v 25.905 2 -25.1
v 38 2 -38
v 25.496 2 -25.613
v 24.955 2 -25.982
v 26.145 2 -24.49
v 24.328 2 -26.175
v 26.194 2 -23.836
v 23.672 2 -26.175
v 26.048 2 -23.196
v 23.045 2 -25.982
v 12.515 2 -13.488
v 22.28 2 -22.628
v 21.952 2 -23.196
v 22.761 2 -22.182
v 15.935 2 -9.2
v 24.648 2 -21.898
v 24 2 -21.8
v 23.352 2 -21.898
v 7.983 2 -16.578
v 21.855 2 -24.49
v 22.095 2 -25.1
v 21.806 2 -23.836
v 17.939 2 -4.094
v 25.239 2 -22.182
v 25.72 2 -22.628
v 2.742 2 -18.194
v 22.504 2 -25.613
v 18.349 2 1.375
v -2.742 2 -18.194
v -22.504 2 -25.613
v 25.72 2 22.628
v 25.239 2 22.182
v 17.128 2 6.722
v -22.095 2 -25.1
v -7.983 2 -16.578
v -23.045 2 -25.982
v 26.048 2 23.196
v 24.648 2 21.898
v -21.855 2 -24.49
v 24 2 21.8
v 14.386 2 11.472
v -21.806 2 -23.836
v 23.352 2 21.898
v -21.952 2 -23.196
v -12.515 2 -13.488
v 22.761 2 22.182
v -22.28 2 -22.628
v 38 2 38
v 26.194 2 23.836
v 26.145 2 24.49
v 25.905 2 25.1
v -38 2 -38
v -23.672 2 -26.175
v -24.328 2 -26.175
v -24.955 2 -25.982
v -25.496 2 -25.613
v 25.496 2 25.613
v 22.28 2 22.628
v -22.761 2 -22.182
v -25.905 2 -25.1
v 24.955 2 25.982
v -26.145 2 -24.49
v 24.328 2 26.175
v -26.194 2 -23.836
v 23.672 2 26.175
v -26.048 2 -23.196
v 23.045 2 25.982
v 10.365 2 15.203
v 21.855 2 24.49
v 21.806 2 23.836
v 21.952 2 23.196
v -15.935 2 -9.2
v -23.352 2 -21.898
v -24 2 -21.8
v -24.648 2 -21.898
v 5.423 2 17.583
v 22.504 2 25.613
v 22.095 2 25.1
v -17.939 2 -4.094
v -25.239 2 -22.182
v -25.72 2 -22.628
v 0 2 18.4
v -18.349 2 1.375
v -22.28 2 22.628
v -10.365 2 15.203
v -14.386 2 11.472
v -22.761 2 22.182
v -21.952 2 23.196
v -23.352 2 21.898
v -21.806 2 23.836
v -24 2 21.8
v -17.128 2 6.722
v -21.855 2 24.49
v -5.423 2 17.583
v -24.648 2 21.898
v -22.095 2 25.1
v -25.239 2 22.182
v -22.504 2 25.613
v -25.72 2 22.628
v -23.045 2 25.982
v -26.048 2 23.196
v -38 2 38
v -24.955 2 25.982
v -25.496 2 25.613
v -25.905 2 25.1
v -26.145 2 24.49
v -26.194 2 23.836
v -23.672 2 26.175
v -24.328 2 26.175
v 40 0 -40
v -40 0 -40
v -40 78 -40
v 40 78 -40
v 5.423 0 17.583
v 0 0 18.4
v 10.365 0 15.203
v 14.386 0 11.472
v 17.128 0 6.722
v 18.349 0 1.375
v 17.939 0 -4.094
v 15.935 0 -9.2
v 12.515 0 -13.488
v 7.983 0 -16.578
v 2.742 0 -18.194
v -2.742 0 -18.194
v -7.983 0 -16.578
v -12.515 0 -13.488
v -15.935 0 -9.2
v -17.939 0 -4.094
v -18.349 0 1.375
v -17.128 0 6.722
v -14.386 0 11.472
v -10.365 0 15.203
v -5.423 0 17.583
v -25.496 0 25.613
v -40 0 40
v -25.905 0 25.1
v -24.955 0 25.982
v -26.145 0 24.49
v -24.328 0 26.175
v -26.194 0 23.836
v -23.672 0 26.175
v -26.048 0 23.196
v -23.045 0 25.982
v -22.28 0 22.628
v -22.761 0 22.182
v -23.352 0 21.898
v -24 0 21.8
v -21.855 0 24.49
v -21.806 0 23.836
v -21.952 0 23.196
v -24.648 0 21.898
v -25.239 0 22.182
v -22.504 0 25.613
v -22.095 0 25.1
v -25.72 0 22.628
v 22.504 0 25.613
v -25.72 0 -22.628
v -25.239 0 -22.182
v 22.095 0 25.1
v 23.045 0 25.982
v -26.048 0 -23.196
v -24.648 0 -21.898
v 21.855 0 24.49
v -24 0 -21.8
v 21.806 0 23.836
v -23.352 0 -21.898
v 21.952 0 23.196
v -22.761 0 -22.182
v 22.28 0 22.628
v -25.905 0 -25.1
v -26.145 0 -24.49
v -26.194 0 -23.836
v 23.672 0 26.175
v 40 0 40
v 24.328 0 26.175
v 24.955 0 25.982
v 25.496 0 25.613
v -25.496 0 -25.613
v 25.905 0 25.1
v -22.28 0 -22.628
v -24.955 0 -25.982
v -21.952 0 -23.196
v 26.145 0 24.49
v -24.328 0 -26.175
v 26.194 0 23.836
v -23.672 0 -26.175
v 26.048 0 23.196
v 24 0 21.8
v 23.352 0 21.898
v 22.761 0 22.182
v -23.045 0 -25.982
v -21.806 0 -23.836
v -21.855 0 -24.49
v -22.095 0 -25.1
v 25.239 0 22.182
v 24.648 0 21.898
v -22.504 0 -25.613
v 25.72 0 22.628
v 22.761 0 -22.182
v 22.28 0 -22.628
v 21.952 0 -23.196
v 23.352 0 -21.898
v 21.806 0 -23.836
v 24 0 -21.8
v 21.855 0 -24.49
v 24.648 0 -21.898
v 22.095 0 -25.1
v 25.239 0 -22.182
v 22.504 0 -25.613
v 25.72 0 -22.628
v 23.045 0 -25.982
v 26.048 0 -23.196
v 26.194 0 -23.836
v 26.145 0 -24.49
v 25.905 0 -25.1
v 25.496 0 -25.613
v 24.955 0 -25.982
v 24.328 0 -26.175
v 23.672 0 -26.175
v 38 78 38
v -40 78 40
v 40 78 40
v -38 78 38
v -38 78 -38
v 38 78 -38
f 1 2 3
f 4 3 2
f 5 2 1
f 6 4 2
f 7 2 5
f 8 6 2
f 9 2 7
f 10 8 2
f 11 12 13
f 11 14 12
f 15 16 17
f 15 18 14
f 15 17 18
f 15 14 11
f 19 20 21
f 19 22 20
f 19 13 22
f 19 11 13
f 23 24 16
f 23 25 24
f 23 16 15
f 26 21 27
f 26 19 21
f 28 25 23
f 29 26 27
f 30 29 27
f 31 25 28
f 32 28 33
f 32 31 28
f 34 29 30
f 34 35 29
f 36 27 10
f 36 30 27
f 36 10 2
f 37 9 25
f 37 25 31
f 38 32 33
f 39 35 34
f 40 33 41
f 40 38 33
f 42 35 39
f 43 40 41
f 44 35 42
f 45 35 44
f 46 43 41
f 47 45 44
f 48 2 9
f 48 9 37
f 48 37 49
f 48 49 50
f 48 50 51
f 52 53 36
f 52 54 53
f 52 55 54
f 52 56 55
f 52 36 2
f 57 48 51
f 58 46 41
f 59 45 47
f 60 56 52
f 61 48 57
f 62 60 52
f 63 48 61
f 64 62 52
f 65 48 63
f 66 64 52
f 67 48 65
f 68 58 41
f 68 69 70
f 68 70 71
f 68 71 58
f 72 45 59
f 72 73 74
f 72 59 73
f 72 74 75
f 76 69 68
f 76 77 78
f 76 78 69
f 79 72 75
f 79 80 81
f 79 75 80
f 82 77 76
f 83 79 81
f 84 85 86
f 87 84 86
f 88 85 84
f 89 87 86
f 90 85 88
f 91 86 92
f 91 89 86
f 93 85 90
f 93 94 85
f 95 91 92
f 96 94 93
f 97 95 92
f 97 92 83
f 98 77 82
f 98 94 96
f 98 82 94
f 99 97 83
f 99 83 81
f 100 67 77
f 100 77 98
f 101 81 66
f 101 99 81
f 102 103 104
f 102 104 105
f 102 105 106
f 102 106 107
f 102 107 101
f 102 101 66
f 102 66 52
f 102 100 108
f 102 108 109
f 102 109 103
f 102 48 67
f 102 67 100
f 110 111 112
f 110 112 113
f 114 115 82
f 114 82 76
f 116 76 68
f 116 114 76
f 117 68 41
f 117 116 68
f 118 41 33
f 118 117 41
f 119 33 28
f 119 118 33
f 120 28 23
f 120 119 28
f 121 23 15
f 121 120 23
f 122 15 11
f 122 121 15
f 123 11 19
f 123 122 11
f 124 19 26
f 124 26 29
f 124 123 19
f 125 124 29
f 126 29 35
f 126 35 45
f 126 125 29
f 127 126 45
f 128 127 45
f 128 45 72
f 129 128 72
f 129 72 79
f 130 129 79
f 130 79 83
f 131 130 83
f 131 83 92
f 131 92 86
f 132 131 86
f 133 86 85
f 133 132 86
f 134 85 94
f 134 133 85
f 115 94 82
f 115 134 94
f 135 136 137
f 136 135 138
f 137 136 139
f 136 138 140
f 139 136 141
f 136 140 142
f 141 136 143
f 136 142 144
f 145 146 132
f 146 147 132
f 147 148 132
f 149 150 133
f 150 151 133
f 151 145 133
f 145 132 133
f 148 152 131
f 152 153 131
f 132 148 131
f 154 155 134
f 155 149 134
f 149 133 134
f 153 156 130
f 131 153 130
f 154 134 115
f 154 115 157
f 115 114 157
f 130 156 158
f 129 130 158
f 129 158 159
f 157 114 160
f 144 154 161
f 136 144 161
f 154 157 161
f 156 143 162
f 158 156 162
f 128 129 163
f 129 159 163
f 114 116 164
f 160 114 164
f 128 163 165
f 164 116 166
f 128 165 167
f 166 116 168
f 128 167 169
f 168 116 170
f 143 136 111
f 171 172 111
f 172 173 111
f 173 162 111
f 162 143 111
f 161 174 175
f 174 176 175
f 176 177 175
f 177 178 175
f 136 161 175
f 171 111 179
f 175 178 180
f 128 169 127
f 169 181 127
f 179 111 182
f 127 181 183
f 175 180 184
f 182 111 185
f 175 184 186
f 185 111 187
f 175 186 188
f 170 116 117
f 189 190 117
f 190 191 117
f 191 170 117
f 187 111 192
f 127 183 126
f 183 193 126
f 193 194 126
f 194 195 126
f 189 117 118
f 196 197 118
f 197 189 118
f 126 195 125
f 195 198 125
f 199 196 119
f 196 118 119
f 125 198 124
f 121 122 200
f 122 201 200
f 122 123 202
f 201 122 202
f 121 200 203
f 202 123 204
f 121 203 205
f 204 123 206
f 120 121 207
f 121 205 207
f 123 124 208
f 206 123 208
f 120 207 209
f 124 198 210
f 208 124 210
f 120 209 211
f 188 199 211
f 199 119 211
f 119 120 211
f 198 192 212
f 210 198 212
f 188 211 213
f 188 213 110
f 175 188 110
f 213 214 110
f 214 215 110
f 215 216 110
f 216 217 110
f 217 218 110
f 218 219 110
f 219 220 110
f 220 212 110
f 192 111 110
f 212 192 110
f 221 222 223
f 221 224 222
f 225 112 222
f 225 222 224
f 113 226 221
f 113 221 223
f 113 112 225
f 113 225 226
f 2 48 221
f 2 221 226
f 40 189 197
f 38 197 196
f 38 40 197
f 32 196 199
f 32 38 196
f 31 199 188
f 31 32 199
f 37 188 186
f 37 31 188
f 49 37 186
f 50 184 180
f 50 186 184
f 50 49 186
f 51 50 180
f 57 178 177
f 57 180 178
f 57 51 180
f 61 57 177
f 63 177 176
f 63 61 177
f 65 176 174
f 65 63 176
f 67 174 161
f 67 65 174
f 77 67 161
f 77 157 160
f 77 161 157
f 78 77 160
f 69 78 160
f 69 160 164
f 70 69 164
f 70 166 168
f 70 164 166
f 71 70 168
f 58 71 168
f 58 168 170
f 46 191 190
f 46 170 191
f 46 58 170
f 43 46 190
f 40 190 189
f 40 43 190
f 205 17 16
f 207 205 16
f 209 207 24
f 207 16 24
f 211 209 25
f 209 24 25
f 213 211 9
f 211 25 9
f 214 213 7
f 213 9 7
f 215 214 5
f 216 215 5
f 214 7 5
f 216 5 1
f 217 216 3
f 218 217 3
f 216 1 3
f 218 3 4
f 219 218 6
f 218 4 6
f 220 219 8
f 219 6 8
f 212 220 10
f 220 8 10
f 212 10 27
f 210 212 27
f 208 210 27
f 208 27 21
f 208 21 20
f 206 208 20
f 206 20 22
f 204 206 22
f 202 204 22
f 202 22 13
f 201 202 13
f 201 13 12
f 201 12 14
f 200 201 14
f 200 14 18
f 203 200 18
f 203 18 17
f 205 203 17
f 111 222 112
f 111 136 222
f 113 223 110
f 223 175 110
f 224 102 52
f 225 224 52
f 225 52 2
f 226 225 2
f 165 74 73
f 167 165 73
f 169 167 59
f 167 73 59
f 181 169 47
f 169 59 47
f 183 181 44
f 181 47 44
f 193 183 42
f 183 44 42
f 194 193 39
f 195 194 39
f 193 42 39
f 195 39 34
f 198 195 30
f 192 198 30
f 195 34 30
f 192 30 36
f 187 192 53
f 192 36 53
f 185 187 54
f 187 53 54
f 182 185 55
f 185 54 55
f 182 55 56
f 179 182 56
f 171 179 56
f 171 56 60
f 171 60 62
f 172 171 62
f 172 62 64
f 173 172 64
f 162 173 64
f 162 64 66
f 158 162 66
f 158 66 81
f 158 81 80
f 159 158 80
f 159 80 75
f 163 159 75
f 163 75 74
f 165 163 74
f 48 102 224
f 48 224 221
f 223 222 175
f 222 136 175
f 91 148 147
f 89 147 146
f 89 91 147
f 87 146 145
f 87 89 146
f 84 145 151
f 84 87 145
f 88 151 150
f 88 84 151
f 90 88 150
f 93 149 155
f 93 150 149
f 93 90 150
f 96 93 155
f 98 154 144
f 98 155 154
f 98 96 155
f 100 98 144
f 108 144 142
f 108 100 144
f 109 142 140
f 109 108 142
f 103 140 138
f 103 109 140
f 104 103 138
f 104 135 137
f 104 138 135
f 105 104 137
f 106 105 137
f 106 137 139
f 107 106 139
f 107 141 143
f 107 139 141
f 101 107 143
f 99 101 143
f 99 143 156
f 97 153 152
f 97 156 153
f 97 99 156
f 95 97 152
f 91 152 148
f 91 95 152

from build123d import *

# Parameters (mm, degrees)
SKETCH1_W               = 80
SKETCH1_H               = 80
SKETCH1_R               = 18.4
BOSS_EXTRUDE1_DEPTH     = 2
SKETCH2_W               = 4
SKETCH2_H               = 18.5
BOSS_EXTRUDE2_DEPTH     = 15.25
SKETCH3_R               = 2.2
CUT_EXTRUDE1_DEPTH      = 94.976393312
MIRROR2_COPY_1_SKETCH_W = 4
MIRROR2_COPY_1_SKETCH_H = 18.5
MIRROR2_COPY_1_DEPTH    = 15.25
MIRROR2_COPY_2_SKETCH_R = 2.2
MIRROR2_COPY_2_DEPTH    = 94.976393312
SKETCH4_R               = 2.2
CUT_EXTRUDE2_DEPTH      = 62.388618652
SKETCH5_W               = 4
SKETCH5_H               = 15.25
CUT_EXTRUDE3_DEPTH      = 93.258129723
SKETCH6_W               = 80
SKETCH6_H               = 80
SKETCH6_W_2             = 76
SKETCH6_H_2             = 76
BOSS_EXTRUDE3_DEPTH     = 76


with BuildPart() as part:
    # Sketch1 → Boss-Extrude1 (new body)
    with BuildSketch(Plane(origin=(0, 0, 0), x_dir=(1, 0, 0), z_dir=(0, 1, 0))):
        Rectangle(SKETCH1_W, SKETCH1_H)
        with Locations(Location((0, 0, 0), (0, 0, 270))):
            Circle(SKETCH1_R, mode=Mode.SUBTRACT)
    extrude(amount=BOSS_EXTRUDE1_DEPTH)

    # Sketch2 → Boss-Extrude2 (add)
    with BuildSketch(Plane(origin=(0, 2, 0), x_dir=(1, 0, 0), z_dir=(0, 1, 0))):
        with Locations((42, -30.75)):
            Rectangle(SKETCH2_W, SKETCH2_H)
    boss_extrude2 = extrude(amount=-BOSS_EXTRUDE2_DEPTH)

    # Sketch3 → Cut-Extrude1 (cut, through all)
    with BuildSketch(Plane(origin=(44, 0, 0), x_dir=(0, 0, -1), z_dir=(1, 0, 0))):
        with Locations((-30.75, -8.125)):
            Circle(SKETCH3_R)
    cut_extrude1 = extrude(amount=-CUT_EXTRUDE1_DEPTH, mode=Mode.SUBTRACT)

    # Mirror1: Boss-Extrude2, Cut-Extrude1 across plane
    add(boss_extrude2.mirror(Plane(origin=(0, 0, 0), x_dir=(0, 0, 1), z_dir=(1, 0, 0))))
    add(cut_extrude1.mirror(Plane(origin=(0, 0, 0), x_dir=(0, 0, 1), z_dir=(1, 0, 0))), mode=Mode.SUBTRACT)

    # Mirror2: Boss-Extrude2, Cut-Extrude1 across plane
    add(boss_extrude2.mirror(Plane(origin=(0, 0, 0), x_dir=(1, 0, 0), z_dir=(0, 0, -1))))
    add(cut_extrude1.mirror(Plane(origin=(0, 0, 0), x_dir=(1, 0, 0), z_dir=(0, 0, -1))), mode=Mode.SUBTRACT)

    # Mirror2 copy 1 sketch → Mirror2 copy 1 (add)
    with BuildSketch(Plane(origin=(0, 2, 0), x_dir=(-1, 0, 0), z_dir=(0, 1, 0))):
        with Locations((42, -30.75)):
            Rectangle(MIRROR2_COPY_1_SKETCH_W, MIRROR2_COPY_1_SKETCH_H)
    extrude(amount=-MIRROR2_COPY_1_DEPTH)

    # Mirror2 copy 2 sketch → Mirror2 copy 2 (cut, through all)
    with BuildSketch(Plane.ZY.offset(44)):
        with Locations((-30.75, -8.125)):
            Circle(MIRROR2_COPY_2_SKETCH_R)
    extrude(amount=-MIRROR2_COPY_2_DEPTH, mode=Mode.SUBTRACT)

    # Sketch4 → Cut-Extrude2 (cut, through all)
    with BuildSketch(Plane(origin=(0, 2, 0), x_dir=(1, 0, 0), z_dir=(0, 1, 0))):
        with Locations(Location((-24, 24, 0), (0, 0, 270))):
            Circle(SKETCH4_R)
        with Locations(Location((24, 24, 0), (0, 0, 270))):
            Circle(SKETCH4_R)
    cut_extrude2 = extrude(amount=-CUT_EXTRUDE2_DEPTH, mode=Mode.SUBTRACT)

    # Mirror3: Cut-Extrude2 across plane
    add(cut_extrude2.mirror(Plane(origin=(0, 0, 0), x_dir=(1, 0, 0), z_dir=(0, 0, -1))), mode=Mode.SUBTRACT)

    # Sketch5 → Cut-Extrude3 (cut, through all)
    with BuildSketch(Plane.XY.offset(40)):
        with Locations((-42, -5.625)):
            Rectangle(SKETCH5_W, SKETCH5_H)
        with Locations((42, -5.625)):
            Rectangle(SKETCH5_W, SKETCH5_H)
    extrude(amount=-CUT_EXTRUDE3_DEPTH, mode=Mode.SUBTRACT)

    # Sketch6 → Boss-Extrude3 (add)
    with BuildSketch(Plane(origin=(0, 2, 0), x_dir=(1, 0, 0), z_dir=(0, 1, 0))):
        Rectangle(SKETCH6_W, SKETCH6_H)
        Rectangle(SKETCH6_W_2, SKETCH6_H_2, mode=Mode.SUBTRACT)
    extrude(amount=BOSS_EXTRUDE3_DEPTH)


solid = part.part
